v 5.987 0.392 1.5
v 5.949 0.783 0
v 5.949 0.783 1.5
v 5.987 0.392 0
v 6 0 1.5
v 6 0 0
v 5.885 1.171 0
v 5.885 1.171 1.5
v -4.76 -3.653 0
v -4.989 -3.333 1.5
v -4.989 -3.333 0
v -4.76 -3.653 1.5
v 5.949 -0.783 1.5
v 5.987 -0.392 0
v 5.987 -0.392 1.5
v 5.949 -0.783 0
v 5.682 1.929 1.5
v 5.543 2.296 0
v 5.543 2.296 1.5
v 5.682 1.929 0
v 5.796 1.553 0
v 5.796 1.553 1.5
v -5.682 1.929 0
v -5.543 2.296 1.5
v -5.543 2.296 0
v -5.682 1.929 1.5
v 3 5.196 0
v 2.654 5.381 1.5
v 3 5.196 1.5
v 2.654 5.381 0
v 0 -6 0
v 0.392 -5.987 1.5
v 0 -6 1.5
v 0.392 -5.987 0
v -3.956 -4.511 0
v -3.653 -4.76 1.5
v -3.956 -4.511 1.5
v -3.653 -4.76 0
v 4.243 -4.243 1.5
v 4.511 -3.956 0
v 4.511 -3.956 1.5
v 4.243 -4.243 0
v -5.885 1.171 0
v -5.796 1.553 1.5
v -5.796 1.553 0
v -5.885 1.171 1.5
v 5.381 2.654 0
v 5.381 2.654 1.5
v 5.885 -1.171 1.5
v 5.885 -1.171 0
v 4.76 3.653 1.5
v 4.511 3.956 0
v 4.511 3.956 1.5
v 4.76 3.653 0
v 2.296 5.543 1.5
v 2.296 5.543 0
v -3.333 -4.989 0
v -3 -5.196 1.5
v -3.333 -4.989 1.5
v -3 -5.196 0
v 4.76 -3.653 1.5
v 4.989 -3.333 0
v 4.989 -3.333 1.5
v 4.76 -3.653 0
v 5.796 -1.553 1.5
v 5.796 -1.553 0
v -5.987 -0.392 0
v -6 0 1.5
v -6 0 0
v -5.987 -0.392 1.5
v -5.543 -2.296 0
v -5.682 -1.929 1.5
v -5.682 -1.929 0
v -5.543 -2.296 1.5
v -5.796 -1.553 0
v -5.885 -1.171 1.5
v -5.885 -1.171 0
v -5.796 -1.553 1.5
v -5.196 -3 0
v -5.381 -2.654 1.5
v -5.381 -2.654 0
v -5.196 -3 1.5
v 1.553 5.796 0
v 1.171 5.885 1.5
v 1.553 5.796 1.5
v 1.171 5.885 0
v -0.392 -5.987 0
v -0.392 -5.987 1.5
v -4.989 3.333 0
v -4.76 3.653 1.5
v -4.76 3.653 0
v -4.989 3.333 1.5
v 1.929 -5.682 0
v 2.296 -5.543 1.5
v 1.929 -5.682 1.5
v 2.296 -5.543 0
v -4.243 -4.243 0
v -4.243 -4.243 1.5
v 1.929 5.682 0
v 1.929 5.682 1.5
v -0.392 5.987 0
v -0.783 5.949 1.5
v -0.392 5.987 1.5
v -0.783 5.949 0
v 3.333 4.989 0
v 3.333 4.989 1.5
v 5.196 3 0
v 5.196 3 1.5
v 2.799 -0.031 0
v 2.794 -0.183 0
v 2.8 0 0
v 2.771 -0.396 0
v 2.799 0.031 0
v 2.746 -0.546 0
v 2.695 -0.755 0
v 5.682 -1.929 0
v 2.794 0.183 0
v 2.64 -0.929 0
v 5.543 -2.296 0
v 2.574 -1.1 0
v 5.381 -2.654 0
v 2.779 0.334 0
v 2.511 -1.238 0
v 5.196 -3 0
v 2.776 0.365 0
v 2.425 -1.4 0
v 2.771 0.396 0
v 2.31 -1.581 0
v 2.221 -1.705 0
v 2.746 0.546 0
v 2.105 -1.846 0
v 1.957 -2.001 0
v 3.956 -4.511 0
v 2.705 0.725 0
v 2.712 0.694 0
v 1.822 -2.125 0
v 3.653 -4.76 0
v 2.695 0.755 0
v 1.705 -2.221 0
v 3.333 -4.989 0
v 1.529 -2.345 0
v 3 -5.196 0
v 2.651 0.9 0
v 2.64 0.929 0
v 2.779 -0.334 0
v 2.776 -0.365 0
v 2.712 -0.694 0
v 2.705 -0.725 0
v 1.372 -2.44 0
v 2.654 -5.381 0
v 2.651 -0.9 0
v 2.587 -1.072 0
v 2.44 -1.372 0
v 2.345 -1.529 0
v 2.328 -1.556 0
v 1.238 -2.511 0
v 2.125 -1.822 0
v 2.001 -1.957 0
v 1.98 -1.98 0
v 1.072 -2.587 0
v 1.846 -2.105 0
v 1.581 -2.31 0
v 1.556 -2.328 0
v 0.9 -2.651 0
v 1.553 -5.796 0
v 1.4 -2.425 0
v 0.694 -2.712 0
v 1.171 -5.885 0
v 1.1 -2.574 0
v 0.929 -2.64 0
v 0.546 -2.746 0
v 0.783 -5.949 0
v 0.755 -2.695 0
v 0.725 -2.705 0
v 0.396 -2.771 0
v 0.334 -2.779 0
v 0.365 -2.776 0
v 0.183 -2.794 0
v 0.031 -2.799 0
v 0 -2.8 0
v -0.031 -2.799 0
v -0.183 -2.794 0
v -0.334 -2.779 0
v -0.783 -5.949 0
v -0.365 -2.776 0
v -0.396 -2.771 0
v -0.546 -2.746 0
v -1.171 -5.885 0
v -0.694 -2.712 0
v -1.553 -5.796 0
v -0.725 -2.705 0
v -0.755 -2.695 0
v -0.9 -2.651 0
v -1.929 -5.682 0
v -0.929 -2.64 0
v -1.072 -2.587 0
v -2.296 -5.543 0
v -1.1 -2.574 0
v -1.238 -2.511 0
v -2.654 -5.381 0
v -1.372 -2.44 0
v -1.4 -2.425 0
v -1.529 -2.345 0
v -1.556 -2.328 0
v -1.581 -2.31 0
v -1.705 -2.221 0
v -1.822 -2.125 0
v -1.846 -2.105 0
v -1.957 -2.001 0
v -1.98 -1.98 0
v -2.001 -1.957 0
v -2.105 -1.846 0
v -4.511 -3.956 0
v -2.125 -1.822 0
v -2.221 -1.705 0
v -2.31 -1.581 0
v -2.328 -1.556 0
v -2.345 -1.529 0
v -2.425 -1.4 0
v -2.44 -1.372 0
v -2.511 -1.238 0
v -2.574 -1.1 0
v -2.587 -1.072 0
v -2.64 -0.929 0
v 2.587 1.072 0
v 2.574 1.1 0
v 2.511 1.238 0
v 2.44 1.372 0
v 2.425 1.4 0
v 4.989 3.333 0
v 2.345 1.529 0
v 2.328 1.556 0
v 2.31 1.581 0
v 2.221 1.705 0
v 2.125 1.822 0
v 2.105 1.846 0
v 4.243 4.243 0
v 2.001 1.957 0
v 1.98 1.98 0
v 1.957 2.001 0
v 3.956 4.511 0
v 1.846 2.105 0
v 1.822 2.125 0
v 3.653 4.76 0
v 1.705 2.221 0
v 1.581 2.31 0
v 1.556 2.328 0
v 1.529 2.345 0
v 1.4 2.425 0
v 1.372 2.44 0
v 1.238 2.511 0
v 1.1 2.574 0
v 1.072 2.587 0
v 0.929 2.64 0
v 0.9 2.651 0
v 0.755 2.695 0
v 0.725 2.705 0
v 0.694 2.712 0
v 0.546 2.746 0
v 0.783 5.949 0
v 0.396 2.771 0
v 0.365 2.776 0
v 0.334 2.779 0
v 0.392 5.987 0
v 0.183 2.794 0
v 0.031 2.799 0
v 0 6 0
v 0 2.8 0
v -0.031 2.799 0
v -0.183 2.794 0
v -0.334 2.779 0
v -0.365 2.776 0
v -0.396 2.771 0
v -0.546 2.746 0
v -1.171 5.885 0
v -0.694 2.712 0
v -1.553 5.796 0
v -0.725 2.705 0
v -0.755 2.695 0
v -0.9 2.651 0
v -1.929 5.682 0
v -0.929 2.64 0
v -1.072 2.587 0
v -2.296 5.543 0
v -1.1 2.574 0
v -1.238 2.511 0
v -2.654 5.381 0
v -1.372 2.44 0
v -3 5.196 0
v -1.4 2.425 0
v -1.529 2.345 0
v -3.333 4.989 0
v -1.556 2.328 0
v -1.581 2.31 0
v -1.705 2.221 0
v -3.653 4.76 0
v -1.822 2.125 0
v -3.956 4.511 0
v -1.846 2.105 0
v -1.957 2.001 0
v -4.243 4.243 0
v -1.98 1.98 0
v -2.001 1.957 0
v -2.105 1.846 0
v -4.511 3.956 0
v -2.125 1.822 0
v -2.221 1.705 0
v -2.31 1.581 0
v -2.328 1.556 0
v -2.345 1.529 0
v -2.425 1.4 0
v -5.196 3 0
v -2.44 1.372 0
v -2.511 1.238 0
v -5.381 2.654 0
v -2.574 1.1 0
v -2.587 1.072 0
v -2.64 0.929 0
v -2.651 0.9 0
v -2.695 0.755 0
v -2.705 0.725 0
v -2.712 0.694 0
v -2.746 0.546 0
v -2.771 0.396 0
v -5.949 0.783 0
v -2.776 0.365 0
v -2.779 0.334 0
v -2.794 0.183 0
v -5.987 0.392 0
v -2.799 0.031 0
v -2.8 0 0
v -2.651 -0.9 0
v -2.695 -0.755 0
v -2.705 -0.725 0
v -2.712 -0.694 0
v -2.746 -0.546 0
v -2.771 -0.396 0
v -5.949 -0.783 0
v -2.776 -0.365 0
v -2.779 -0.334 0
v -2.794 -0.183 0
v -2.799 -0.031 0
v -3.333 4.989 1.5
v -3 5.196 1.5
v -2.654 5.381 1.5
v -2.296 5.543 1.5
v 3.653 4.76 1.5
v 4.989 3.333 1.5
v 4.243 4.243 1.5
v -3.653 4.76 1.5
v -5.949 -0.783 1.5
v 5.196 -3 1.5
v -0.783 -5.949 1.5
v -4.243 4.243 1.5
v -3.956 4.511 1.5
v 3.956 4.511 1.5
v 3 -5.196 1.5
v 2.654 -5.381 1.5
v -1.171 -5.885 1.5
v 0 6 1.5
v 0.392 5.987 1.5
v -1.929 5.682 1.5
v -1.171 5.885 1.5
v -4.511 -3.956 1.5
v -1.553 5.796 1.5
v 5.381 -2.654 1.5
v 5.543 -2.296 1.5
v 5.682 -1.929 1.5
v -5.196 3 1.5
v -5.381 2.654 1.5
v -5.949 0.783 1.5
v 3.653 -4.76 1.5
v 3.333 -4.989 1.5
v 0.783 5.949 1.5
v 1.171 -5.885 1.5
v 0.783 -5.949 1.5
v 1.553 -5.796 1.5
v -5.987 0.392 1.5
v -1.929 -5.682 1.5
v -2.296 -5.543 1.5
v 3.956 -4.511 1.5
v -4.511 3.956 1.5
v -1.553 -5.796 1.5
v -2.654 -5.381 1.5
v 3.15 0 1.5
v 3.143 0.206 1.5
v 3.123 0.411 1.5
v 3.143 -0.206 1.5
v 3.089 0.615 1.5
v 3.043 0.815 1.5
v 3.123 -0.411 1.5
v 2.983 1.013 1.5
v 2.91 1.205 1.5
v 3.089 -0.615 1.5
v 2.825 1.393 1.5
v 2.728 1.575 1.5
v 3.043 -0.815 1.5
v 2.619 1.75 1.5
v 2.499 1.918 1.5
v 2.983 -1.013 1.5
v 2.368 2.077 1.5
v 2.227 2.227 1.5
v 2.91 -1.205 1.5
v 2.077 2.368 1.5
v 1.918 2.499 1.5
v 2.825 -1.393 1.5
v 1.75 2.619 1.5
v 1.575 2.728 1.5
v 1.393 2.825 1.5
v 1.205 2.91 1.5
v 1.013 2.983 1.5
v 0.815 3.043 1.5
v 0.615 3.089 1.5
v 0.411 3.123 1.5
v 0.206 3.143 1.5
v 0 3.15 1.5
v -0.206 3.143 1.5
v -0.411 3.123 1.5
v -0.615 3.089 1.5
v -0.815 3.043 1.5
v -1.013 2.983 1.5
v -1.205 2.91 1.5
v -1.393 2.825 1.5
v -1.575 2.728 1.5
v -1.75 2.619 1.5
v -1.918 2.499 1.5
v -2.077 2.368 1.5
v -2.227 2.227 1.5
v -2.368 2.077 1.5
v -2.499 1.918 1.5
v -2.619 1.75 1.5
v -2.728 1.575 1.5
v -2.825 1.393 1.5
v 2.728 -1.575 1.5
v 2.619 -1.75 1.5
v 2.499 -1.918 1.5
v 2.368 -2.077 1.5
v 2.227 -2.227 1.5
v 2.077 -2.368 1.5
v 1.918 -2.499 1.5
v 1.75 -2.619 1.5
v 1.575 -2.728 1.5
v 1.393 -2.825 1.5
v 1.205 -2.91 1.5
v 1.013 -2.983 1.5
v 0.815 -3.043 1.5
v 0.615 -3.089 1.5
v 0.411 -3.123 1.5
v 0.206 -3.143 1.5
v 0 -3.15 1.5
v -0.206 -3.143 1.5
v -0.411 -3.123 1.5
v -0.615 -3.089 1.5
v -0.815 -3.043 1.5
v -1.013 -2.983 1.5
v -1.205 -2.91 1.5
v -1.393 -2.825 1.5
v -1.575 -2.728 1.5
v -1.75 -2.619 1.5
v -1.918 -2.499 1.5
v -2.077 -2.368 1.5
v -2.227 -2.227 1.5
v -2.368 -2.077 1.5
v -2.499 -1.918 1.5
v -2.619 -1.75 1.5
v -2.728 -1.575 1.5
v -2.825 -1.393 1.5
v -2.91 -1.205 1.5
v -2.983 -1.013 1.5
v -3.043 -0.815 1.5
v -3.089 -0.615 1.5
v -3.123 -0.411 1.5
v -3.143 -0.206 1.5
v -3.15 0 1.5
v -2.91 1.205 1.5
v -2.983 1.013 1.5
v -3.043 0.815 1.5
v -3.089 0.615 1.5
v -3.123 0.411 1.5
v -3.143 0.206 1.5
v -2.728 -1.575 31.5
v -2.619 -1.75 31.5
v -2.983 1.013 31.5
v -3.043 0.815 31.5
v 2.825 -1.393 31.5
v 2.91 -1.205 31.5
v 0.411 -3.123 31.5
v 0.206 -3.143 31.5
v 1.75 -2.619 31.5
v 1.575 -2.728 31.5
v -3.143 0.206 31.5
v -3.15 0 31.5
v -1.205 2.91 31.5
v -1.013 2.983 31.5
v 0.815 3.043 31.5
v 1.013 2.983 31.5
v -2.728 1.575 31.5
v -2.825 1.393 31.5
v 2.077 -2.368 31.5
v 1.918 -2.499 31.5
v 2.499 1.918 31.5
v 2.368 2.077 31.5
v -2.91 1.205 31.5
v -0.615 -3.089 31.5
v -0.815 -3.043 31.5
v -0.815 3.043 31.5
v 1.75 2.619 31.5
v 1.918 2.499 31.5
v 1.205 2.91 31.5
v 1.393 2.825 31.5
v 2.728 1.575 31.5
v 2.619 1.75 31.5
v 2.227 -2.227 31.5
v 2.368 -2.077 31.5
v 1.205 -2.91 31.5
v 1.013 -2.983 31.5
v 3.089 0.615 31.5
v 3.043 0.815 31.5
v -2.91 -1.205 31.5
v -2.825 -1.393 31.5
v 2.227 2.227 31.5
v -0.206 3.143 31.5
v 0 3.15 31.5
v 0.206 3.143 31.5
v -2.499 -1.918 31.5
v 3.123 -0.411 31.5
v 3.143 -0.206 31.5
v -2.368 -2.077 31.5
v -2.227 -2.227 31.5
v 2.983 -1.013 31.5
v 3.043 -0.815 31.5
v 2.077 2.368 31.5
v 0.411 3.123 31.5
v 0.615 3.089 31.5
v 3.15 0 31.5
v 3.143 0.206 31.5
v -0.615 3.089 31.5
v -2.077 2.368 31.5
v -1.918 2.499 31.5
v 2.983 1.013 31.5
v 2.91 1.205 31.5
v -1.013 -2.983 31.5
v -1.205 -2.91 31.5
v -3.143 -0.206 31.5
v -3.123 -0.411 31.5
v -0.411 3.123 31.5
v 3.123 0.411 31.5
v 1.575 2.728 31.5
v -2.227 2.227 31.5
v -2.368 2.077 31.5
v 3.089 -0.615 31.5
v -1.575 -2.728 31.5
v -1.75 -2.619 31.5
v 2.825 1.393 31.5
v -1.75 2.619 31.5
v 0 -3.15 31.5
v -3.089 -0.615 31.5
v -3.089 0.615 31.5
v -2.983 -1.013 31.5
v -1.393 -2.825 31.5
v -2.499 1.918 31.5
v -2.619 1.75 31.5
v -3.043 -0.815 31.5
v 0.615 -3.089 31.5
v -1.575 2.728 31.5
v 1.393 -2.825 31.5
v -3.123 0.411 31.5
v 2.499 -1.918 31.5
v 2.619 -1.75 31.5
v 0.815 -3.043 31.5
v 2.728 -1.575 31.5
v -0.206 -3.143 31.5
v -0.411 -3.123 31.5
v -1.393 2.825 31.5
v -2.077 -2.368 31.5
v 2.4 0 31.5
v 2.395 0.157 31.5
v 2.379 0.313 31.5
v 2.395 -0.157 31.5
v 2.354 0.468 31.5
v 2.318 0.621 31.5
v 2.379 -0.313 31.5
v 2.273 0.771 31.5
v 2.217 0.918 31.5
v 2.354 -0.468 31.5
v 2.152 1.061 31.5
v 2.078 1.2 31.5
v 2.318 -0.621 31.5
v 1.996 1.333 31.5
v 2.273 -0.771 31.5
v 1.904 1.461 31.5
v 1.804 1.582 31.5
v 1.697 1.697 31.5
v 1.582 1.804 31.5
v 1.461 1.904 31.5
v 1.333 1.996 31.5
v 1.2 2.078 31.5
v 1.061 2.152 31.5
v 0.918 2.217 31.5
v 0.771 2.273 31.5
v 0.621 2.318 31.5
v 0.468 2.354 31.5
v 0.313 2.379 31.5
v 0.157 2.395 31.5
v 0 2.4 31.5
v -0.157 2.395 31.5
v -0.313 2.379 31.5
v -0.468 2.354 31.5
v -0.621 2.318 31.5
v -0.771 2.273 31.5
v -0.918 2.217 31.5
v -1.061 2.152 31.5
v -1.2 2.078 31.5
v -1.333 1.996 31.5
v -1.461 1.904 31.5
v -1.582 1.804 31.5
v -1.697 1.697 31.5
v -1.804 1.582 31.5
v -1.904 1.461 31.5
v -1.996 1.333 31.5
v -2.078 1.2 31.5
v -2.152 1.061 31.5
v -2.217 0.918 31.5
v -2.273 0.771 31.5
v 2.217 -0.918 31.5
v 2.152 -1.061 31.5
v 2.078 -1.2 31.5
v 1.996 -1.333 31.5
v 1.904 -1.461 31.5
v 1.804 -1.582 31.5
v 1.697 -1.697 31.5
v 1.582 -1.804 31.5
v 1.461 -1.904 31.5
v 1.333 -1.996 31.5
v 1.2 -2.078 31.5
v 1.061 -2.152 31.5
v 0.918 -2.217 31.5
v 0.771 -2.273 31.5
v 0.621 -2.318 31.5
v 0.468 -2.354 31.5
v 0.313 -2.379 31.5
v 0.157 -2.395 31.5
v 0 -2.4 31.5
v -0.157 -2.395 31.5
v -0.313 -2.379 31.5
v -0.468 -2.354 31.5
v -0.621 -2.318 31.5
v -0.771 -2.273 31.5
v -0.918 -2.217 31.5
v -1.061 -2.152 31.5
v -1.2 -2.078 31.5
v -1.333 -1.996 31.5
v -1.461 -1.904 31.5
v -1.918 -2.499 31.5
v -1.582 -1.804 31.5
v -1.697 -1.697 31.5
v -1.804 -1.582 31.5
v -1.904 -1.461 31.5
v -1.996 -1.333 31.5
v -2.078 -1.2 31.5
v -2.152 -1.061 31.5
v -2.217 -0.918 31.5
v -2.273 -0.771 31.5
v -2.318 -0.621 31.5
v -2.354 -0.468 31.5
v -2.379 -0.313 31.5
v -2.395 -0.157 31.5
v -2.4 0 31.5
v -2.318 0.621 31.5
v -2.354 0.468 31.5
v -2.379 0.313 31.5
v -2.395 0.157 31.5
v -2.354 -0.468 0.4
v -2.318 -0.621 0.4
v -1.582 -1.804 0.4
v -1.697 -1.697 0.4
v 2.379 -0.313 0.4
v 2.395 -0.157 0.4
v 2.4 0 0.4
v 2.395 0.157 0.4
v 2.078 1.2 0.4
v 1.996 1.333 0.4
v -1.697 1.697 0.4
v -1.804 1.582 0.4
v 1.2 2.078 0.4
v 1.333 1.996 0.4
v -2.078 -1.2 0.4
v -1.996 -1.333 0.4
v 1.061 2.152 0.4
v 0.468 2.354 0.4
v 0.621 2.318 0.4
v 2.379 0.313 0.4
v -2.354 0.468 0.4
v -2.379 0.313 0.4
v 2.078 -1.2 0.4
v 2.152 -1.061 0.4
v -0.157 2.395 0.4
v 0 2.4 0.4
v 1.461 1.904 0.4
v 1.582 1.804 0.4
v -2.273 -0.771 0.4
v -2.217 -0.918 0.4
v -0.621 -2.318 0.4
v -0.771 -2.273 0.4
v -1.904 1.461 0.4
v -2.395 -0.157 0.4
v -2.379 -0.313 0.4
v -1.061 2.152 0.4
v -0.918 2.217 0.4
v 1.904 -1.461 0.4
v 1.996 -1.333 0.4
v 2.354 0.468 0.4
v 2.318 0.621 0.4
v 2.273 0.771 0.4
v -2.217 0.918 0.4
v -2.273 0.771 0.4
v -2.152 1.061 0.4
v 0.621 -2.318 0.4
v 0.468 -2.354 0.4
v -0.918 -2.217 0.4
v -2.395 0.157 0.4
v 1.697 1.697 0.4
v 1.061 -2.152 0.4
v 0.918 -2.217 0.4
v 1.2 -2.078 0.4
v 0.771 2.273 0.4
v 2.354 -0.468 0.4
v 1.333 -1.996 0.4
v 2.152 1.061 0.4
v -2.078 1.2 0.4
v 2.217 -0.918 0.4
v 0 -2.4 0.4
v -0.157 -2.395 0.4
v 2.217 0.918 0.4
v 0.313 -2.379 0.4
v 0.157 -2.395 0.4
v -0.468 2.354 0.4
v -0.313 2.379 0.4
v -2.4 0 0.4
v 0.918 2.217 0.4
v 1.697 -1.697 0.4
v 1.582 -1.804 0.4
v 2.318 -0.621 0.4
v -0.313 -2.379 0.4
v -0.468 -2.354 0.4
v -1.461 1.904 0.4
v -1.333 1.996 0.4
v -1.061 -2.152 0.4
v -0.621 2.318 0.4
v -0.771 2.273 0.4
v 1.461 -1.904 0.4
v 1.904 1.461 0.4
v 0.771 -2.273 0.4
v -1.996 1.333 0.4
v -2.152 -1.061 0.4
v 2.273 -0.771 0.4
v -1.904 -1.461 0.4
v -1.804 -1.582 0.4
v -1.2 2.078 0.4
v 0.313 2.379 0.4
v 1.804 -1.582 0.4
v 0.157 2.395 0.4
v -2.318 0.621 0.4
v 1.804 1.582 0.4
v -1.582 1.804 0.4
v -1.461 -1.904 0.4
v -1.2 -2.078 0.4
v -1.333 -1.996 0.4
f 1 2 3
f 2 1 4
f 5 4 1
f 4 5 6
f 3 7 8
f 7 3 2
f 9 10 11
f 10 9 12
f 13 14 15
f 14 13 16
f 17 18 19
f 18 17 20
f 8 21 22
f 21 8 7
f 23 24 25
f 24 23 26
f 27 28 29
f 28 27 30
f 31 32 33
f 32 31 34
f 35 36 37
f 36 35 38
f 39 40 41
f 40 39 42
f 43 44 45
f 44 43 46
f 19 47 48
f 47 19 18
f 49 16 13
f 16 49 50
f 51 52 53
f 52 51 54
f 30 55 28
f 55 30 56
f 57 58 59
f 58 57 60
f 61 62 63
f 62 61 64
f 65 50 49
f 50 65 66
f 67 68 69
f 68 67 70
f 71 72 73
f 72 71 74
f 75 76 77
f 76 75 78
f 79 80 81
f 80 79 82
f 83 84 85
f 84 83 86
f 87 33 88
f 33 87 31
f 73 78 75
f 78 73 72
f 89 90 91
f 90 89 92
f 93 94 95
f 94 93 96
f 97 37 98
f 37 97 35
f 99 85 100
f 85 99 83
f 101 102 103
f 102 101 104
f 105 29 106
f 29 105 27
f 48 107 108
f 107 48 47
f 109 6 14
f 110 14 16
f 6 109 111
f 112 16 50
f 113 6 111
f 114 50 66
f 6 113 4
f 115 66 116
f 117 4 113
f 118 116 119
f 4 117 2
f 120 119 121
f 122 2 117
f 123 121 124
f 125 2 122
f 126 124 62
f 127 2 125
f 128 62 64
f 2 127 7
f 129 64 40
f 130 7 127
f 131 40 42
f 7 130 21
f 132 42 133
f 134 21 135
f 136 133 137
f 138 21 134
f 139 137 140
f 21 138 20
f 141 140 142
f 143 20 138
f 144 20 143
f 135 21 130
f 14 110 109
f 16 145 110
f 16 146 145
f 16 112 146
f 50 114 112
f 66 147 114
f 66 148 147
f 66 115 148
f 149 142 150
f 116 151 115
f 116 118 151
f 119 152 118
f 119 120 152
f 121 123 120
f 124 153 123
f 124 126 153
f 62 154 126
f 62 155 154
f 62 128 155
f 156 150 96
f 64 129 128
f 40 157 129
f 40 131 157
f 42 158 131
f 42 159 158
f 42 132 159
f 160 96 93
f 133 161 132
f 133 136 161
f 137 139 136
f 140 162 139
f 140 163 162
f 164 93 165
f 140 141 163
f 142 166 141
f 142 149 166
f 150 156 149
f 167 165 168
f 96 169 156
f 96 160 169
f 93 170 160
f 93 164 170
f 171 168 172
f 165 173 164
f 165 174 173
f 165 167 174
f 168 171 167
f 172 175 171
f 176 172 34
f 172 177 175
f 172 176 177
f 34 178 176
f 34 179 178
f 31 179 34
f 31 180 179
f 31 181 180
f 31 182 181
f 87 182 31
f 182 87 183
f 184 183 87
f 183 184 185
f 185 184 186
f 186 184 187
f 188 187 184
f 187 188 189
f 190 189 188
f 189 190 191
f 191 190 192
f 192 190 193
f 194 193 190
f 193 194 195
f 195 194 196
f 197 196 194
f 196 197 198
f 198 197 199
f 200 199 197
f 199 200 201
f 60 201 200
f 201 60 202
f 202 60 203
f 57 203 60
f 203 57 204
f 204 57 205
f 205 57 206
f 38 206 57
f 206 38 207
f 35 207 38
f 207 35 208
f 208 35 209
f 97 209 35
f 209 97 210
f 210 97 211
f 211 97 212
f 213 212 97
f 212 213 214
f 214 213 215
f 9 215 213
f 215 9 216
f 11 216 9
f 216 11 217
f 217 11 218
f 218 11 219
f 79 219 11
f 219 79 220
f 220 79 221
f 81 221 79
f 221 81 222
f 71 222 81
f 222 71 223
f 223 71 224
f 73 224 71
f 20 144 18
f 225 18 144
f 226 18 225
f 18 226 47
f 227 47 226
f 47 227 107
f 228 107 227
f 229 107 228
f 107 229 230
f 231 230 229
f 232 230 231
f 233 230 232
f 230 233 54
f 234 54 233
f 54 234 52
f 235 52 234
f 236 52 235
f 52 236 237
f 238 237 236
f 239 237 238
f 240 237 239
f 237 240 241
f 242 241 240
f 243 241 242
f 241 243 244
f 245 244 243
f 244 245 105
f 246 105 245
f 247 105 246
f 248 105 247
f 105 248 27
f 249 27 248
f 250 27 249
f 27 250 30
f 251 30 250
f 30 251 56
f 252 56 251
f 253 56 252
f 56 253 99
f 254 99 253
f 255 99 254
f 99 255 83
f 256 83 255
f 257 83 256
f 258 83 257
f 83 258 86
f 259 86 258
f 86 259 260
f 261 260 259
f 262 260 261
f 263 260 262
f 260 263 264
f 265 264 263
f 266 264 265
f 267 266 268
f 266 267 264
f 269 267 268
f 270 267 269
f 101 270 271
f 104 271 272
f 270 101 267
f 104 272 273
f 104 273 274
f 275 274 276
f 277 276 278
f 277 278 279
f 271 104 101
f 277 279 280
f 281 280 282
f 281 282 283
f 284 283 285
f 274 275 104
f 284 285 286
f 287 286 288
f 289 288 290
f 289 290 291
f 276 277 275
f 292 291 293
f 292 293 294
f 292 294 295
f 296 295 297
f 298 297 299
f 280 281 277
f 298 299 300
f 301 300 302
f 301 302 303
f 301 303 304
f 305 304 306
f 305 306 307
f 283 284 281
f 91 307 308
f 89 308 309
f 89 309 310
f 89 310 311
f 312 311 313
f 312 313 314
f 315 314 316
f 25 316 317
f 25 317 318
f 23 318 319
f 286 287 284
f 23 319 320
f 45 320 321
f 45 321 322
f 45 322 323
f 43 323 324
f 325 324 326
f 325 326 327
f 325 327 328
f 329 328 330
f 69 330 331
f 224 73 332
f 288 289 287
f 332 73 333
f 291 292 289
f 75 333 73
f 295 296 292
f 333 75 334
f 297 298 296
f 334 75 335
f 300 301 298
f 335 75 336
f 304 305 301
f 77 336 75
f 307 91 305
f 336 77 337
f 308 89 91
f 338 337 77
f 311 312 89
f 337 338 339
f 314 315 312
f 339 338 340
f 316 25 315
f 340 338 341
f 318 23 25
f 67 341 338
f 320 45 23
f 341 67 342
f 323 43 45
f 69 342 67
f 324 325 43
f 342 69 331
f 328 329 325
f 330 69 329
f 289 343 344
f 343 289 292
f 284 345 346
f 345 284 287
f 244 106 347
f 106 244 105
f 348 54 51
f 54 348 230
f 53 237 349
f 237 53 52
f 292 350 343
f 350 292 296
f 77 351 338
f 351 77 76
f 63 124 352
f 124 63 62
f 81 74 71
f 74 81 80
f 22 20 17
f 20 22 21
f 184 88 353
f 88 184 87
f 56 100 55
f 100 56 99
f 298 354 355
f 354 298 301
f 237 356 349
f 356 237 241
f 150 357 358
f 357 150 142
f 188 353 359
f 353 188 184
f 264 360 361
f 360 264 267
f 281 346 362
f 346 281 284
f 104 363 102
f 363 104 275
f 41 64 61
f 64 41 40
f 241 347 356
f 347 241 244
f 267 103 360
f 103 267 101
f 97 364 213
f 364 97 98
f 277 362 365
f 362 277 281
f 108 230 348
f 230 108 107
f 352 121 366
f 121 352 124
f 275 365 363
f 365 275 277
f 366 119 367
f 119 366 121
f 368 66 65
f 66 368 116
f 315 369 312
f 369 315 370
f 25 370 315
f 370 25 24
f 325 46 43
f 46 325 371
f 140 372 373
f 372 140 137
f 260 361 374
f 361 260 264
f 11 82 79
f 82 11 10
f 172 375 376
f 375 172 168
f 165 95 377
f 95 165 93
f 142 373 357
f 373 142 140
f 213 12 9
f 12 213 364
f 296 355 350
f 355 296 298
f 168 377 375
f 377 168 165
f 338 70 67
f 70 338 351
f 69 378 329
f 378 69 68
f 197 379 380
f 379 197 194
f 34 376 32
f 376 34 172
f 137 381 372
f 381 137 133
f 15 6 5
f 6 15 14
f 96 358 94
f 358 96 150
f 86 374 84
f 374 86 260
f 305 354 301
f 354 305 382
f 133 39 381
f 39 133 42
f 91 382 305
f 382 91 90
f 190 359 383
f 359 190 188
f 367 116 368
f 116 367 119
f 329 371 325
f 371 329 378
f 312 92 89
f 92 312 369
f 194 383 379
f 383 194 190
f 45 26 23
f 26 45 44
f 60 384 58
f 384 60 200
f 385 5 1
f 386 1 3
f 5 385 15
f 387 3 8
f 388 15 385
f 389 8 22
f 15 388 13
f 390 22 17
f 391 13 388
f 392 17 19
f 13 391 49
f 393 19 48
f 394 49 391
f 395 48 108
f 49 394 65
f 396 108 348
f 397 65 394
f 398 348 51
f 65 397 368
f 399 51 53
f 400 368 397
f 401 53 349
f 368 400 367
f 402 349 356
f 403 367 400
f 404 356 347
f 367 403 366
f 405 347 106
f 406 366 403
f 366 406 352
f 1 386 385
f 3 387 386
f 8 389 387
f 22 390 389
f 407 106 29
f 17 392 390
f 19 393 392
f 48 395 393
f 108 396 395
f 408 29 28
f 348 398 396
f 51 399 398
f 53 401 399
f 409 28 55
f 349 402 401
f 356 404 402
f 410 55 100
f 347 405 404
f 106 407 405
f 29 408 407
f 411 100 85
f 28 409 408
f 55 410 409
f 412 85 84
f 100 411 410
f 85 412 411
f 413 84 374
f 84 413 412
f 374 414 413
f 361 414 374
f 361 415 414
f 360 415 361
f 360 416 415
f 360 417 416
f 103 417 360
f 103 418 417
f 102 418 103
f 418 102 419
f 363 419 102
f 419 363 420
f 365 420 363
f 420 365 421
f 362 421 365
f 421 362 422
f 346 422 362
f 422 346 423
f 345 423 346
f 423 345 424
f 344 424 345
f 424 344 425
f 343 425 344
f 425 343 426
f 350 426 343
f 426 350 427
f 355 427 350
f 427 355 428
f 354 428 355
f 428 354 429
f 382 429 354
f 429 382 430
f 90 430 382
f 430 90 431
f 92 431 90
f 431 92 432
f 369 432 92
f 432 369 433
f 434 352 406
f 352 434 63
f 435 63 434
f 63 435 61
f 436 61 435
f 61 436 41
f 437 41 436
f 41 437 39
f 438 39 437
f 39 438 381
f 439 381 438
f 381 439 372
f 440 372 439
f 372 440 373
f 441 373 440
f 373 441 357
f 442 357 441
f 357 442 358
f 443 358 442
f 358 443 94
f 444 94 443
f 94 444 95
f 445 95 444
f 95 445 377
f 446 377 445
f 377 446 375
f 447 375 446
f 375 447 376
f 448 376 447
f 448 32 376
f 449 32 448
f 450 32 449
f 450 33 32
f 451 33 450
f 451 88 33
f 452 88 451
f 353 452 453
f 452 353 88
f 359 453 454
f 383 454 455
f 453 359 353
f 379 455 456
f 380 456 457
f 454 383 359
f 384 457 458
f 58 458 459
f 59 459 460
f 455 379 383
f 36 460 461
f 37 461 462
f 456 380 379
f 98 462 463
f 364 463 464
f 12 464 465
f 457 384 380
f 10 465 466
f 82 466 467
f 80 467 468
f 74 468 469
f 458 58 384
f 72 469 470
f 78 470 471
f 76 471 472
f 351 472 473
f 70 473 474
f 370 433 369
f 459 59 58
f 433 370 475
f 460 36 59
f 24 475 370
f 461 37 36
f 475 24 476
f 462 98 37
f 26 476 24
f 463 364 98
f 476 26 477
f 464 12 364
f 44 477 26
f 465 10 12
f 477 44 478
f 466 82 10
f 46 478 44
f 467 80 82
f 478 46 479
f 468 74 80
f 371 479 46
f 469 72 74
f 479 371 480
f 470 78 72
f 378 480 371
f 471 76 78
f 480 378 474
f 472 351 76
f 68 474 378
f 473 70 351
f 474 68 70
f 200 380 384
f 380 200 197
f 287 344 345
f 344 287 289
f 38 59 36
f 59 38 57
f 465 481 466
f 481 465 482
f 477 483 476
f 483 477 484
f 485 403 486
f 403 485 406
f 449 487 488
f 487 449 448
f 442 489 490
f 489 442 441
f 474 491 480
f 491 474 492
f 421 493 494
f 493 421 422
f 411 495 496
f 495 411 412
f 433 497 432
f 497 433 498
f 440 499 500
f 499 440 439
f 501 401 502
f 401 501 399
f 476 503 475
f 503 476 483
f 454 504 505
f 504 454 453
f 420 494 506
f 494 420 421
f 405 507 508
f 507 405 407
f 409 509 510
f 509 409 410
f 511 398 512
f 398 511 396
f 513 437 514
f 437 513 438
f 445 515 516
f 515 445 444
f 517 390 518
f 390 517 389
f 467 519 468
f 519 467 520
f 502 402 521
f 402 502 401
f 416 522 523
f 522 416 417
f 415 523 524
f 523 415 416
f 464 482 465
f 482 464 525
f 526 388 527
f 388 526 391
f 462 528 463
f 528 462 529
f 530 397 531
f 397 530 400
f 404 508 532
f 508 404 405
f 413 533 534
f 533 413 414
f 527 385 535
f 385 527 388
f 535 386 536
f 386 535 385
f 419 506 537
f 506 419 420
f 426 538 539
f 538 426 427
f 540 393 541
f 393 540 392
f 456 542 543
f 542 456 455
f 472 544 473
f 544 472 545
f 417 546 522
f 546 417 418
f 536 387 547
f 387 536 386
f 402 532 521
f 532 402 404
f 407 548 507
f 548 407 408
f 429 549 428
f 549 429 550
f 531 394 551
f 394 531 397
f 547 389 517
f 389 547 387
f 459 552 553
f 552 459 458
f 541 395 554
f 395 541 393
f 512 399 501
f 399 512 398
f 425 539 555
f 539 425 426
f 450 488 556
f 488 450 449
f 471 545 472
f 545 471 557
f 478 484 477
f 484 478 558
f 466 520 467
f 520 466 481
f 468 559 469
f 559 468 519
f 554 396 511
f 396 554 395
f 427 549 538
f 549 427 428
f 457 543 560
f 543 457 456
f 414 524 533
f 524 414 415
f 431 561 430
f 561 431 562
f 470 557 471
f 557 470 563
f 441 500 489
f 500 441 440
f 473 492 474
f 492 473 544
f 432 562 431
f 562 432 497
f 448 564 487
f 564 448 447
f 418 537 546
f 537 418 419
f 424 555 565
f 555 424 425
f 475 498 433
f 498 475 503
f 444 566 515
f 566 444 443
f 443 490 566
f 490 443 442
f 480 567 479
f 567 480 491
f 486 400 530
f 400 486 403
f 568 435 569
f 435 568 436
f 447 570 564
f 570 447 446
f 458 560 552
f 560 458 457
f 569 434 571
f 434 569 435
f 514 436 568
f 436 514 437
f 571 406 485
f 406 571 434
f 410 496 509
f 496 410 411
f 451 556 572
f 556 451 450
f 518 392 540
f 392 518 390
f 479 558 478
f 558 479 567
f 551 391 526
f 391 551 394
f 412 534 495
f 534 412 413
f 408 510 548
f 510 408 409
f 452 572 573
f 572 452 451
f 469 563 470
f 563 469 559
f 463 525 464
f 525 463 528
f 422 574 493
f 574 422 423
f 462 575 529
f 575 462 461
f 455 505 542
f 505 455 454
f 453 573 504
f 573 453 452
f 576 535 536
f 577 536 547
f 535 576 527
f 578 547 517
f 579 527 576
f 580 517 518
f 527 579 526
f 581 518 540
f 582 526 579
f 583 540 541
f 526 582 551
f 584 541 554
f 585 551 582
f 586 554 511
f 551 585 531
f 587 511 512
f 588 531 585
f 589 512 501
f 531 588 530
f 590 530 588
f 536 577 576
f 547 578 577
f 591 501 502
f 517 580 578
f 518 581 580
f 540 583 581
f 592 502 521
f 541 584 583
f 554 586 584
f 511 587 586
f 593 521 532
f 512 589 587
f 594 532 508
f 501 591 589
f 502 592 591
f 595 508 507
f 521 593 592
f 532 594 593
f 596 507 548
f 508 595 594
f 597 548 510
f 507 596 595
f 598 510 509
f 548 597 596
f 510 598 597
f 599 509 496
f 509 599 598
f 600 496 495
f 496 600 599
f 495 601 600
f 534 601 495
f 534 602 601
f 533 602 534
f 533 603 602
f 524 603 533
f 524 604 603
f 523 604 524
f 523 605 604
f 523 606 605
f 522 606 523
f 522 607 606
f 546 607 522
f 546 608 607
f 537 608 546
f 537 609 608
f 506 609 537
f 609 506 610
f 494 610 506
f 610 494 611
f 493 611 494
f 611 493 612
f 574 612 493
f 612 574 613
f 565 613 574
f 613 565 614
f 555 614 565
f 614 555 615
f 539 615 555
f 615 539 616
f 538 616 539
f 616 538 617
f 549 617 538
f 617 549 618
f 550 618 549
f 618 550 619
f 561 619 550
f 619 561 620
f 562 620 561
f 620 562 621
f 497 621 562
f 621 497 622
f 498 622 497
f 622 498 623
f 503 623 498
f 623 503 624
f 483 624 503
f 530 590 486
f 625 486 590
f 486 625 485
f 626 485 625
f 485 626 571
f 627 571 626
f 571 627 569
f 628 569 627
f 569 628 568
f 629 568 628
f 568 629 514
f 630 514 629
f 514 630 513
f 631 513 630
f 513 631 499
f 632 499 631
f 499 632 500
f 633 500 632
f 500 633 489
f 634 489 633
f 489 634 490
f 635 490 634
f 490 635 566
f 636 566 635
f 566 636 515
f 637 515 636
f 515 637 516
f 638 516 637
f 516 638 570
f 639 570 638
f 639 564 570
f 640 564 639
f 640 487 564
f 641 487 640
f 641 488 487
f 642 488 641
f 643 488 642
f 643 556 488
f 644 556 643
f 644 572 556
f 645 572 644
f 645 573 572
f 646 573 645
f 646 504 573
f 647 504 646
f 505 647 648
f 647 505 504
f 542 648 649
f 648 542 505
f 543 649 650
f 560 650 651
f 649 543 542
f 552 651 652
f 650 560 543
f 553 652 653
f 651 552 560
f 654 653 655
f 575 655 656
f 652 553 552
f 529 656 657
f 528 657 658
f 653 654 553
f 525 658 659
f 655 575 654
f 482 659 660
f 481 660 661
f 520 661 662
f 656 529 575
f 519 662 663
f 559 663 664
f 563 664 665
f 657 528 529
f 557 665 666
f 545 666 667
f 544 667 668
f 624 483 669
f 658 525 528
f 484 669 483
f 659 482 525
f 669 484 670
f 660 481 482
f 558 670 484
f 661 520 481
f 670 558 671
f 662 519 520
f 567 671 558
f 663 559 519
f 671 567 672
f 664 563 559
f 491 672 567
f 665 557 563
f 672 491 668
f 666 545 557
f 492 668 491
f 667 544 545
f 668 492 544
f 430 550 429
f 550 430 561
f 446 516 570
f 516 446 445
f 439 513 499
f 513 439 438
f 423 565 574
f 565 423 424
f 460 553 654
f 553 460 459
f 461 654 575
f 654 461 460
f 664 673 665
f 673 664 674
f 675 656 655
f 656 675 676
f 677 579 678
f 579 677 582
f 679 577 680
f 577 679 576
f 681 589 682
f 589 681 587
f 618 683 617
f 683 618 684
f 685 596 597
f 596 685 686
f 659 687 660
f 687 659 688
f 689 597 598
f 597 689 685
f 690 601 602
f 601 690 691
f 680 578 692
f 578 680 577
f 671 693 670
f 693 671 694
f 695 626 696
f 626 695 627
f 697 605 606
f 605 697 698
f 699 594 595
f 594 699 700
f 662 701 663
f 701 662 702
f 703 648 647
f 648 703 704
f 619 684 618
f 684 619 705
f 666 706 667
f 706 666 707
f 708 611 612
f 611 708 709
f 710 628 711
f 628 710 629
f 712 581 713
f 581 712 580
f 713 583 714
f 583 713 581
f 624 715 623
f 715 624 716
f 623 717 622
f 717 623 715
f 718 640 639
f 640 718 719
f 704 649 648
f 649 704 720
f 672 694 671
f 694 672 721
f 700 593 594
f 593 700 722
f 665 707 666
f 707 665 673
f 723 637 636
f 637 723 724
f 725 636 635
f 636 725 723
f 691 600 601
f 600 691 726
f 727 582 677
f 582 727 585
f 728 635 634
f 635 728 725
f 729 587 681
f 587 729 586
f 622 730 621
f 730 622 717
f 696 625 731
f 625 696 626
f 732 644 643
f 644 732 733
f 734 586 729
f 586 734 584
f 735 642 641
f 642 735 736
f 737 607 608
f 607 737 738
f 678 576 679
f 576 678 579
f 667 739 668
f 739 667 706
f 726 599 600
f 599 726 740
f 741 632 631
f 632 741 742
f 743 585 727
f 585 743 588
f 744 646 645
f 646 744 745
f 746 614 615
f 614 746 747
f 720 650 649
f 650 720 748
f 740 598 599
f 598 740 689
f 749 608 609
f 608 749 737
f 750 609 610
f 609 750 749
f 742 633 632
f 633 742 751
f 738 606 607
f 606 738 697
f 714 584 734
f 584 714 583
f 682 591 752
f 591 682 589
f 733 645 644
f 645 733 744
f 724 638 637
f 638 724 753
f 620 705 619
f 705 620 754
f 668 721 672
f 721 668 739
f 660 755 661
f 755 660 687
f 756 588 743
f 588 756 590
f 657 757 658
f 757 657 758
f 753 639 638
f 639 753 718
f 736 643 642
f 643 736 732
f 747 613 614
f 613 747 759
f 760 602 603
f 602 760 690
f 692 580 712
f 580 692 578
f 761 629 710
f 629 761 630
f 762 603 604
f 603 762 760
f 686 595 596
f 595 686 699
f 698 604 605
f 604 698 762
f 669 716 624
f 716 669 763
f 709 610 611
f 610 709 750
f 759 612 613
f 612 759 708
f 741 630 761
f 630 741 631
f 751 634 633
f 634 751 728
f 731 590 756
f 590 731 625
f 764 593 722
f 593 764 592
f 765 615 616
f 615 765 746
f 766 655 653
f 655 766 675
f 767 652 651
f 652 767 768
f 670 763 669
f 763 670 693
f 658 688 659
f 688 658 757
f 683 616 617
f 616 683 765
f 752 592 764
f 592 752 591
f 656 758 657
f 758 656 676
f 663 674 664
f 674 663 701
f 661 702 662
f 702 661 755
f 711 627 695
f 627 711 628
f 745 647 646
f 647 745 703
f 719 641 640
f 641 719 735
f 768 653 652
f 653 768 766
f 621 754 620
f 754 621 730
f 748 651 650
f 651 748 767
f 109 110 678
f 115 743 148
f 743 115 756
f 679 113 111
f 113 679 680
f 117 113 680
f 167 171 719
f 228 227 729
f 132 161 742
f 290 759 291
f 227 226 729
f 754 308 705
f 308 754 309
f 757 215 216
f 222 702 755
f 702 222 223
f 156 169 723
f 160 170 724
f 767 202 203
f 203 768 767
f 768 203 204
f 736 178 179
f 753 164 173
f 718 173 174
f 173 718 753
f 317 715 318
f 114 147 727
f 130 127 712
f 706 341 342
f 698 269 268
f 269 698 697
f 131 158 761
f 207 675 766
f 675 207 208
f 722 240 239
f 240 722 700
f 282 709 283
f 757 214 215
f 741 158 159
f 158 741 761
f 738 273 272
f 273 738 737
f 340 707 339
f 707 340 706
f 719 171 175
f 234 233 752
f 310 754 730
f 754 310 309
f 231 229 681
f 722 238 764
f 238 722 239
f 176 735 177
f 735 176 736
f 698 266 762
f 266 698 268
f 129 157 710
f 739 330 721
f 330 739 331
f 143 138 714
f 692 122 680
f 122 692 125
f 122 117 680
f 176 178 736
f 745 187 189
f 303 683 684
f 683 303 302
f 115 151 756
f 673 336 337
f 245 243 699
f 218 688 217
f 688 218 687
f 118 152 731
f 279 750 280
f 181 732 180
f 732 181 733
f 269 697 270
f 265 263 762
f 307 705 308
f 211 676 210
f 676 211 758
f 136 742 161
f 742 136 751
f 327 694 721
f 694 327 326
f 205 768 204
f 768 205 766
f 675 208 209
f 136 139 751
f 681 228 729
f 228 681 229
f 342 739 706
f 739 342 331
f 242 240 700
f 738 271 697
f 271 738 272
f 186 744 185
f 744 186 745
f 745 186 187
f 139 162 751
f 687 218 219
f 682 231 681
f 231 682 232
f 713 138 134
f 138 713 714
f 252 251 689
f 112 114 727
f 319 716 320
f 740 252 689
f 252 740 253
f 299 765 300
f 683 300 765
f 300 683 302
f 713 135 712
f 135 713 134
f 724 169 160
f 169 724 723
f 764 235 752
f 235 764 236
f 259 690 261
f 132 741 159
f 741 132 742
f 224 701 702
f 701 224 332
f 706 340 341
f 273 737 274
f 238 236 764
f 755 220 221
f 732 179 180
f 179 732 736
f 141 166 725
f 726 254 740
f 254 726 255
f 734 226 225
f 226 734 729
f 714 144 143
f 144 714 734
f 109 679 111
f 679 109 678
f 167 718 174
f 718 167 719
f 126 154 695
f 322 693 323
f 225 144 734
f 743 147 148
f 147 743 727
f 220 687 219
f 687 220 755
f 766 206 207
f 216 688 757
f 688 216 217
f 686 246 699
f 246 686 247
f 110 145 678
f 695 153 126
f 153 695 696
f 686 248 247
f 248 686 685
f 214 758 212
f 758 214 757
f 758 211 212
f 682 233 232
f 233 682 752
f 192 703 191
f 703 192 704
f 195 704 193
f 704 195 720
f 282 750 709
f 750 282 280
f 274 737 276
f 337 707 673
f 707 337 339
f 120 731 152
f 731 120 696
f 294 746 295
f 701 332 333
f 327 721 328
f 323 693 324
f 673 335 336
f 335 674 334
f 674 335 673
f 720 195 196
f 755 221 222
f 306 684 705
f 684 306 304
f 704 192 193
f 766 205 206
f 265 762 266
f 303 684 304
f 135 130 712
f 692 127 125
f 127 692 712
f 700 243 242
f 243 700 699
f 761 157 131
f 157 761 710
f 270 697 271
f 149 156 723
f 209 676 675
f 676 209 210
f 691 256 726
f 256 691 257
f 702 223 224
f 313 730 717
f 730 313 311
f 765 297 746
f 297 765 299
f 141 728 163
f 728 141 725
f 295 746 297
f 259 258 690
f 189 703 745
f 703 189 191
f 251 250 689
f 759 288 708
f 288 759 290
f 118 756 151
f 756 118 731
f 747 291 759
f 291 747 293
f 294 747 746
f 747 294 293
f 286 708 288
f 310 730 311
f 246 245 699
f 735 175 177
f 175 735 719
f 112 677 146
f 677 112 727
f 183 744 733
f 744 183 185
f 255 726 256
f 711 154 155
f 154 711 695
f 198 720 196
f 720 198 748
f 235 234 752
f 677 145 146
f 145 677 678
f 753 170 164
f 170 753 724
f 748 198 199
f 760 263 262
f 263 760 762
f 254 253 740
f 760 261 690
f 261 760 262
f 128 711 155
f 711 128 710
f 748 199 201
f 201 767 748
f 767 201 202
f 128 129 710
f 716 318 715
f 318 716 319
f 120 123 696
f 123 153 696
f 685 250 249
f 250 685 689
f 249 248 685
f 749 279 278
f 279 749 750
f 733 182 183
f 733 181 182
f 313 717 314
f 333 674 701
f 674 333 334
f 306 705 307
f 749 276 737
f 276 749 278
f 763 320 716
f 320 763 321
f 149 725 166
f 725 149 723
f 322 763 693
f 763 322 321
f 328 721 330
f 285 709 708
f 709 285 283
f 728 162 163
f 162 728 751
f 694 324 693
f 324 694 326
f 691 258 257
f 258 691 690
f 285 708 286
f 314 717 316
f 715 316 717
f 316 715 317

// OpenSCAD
// Nozzle adapter — Ø4.5 nozzle/hose → Ø6.3 hole reducer bushing.
//
// Plain sleeve, OD 6.3 / bore 4.8, 30 mm long, with a larger flange ring at
// ONE end only. The flange (Ø12) cannot pass through the Ø6.3 hole, so it
// catches on the hole's rim and sets the insertion depth — the adapter can
// only ever go in from the flange side.
//
//  ┌──────────┐   ← flange  Ø12 × 1.5  (catches on the hole rim)
//  └──┐█  █┌──┘
//     │█  █│
//     │█  █│      ← sleeve  Ø6.3 / Ø4.8, 30 mm (inside the hole)
//     │█  █│
//     └█  █┘      ← square end, no chamfer
//
// DATUM: z = 0 is the flange's outer (exposed) face. The seating face —
// the flange underside that bears on the panel around the hole — is at
// z = flange_t; the sleeve runs z = flange_t → flange_t + sleeve_len.
//
// The hose is pushed in from the flange side (the bore mouth is chamfered
// there) and is gripped along the full 30 mm bore.
//
// PRINT: as modeled — flange flat on the bed, sleeve pointing up. No
// supports needed. The 0.75 mm wall is thin: check the slicer actually
// fills it (2 perimeters at ~0.36 mm extrusion width) instead of leaving a
// gap, and keep the layer height ≤ 0.2 so the 30 mm tube stays true.

$fn = 96;
eps = 0.1;

// ---- Mating parts (nominal, measured) ----
hole_d   = 6.3;   // bore Ø of the hole the adapter drops into
nozzle_d = 4.5;   // outer Ø of the nozzle/hose the adapter grips

// ---- Fit (tune from test prints; negative = interference) ----
gap_hole   = 0;      // per-side clearance, sleeve OD vs hole — RAISE if the
                     // sleeve won't push in, LOWER (negative) if it rattles
gap_nozzle = 0.15;   // per-side clearance, bore vs hose — opened up from 0
                     // because the hose would not enter the Ø4.5 bore. Bore
                     // = 4.8. Still tight? go 0.25 (Ø5.0); past ~0.3 the
                     // wall drops under 0.6 mm and gets unprintable, so at
                     // that point widen hole_d/the sleeve OD instead.

// ---- Sleeve ----
sleeve_len = 30;  // insertion length (depth into the hole)

// ---- Flange (one end only; must NOT fit through hole_d) ----
flange_d     = 12;   // 2.85 radial lip beyond the Ø6.3 hole
flange_t     = 1.5;
bore_lead_in = 0.4;  // 45° chamfer at the bore mouth, hose entry side

// ---- Derived ----
sleeve_od = hole_d   - 2 * gap_hole;     // 6.3
bore_d    = nozzle_d + 2 * gap_nozzle;   // 4.8
total_h   = flange_t + sleeve_len;       // 31.5

module nozzle_adapter() {
    difference() {
        union() {
            cylinder(d = flange_d,  h = flange_t);
            cylinder(d = sleeve_od, h = total_h);
        }

        // Hose bore — straight through flange + sleeve.
        translate([0, 0, -eps])
            cylinder(d = bore_d, h = total_h + 2 * eps);

        // Bore mouth chamfer on the flange face (hose entry).
        translate([0, 0, -eps])
            cylinder(d1 = bore_d + 2 * (bore_lead_in + eps),
                     d2 = bore_d,
                     h  = bore_lead_in + eps);
    }
}

nozzle_adapter();
